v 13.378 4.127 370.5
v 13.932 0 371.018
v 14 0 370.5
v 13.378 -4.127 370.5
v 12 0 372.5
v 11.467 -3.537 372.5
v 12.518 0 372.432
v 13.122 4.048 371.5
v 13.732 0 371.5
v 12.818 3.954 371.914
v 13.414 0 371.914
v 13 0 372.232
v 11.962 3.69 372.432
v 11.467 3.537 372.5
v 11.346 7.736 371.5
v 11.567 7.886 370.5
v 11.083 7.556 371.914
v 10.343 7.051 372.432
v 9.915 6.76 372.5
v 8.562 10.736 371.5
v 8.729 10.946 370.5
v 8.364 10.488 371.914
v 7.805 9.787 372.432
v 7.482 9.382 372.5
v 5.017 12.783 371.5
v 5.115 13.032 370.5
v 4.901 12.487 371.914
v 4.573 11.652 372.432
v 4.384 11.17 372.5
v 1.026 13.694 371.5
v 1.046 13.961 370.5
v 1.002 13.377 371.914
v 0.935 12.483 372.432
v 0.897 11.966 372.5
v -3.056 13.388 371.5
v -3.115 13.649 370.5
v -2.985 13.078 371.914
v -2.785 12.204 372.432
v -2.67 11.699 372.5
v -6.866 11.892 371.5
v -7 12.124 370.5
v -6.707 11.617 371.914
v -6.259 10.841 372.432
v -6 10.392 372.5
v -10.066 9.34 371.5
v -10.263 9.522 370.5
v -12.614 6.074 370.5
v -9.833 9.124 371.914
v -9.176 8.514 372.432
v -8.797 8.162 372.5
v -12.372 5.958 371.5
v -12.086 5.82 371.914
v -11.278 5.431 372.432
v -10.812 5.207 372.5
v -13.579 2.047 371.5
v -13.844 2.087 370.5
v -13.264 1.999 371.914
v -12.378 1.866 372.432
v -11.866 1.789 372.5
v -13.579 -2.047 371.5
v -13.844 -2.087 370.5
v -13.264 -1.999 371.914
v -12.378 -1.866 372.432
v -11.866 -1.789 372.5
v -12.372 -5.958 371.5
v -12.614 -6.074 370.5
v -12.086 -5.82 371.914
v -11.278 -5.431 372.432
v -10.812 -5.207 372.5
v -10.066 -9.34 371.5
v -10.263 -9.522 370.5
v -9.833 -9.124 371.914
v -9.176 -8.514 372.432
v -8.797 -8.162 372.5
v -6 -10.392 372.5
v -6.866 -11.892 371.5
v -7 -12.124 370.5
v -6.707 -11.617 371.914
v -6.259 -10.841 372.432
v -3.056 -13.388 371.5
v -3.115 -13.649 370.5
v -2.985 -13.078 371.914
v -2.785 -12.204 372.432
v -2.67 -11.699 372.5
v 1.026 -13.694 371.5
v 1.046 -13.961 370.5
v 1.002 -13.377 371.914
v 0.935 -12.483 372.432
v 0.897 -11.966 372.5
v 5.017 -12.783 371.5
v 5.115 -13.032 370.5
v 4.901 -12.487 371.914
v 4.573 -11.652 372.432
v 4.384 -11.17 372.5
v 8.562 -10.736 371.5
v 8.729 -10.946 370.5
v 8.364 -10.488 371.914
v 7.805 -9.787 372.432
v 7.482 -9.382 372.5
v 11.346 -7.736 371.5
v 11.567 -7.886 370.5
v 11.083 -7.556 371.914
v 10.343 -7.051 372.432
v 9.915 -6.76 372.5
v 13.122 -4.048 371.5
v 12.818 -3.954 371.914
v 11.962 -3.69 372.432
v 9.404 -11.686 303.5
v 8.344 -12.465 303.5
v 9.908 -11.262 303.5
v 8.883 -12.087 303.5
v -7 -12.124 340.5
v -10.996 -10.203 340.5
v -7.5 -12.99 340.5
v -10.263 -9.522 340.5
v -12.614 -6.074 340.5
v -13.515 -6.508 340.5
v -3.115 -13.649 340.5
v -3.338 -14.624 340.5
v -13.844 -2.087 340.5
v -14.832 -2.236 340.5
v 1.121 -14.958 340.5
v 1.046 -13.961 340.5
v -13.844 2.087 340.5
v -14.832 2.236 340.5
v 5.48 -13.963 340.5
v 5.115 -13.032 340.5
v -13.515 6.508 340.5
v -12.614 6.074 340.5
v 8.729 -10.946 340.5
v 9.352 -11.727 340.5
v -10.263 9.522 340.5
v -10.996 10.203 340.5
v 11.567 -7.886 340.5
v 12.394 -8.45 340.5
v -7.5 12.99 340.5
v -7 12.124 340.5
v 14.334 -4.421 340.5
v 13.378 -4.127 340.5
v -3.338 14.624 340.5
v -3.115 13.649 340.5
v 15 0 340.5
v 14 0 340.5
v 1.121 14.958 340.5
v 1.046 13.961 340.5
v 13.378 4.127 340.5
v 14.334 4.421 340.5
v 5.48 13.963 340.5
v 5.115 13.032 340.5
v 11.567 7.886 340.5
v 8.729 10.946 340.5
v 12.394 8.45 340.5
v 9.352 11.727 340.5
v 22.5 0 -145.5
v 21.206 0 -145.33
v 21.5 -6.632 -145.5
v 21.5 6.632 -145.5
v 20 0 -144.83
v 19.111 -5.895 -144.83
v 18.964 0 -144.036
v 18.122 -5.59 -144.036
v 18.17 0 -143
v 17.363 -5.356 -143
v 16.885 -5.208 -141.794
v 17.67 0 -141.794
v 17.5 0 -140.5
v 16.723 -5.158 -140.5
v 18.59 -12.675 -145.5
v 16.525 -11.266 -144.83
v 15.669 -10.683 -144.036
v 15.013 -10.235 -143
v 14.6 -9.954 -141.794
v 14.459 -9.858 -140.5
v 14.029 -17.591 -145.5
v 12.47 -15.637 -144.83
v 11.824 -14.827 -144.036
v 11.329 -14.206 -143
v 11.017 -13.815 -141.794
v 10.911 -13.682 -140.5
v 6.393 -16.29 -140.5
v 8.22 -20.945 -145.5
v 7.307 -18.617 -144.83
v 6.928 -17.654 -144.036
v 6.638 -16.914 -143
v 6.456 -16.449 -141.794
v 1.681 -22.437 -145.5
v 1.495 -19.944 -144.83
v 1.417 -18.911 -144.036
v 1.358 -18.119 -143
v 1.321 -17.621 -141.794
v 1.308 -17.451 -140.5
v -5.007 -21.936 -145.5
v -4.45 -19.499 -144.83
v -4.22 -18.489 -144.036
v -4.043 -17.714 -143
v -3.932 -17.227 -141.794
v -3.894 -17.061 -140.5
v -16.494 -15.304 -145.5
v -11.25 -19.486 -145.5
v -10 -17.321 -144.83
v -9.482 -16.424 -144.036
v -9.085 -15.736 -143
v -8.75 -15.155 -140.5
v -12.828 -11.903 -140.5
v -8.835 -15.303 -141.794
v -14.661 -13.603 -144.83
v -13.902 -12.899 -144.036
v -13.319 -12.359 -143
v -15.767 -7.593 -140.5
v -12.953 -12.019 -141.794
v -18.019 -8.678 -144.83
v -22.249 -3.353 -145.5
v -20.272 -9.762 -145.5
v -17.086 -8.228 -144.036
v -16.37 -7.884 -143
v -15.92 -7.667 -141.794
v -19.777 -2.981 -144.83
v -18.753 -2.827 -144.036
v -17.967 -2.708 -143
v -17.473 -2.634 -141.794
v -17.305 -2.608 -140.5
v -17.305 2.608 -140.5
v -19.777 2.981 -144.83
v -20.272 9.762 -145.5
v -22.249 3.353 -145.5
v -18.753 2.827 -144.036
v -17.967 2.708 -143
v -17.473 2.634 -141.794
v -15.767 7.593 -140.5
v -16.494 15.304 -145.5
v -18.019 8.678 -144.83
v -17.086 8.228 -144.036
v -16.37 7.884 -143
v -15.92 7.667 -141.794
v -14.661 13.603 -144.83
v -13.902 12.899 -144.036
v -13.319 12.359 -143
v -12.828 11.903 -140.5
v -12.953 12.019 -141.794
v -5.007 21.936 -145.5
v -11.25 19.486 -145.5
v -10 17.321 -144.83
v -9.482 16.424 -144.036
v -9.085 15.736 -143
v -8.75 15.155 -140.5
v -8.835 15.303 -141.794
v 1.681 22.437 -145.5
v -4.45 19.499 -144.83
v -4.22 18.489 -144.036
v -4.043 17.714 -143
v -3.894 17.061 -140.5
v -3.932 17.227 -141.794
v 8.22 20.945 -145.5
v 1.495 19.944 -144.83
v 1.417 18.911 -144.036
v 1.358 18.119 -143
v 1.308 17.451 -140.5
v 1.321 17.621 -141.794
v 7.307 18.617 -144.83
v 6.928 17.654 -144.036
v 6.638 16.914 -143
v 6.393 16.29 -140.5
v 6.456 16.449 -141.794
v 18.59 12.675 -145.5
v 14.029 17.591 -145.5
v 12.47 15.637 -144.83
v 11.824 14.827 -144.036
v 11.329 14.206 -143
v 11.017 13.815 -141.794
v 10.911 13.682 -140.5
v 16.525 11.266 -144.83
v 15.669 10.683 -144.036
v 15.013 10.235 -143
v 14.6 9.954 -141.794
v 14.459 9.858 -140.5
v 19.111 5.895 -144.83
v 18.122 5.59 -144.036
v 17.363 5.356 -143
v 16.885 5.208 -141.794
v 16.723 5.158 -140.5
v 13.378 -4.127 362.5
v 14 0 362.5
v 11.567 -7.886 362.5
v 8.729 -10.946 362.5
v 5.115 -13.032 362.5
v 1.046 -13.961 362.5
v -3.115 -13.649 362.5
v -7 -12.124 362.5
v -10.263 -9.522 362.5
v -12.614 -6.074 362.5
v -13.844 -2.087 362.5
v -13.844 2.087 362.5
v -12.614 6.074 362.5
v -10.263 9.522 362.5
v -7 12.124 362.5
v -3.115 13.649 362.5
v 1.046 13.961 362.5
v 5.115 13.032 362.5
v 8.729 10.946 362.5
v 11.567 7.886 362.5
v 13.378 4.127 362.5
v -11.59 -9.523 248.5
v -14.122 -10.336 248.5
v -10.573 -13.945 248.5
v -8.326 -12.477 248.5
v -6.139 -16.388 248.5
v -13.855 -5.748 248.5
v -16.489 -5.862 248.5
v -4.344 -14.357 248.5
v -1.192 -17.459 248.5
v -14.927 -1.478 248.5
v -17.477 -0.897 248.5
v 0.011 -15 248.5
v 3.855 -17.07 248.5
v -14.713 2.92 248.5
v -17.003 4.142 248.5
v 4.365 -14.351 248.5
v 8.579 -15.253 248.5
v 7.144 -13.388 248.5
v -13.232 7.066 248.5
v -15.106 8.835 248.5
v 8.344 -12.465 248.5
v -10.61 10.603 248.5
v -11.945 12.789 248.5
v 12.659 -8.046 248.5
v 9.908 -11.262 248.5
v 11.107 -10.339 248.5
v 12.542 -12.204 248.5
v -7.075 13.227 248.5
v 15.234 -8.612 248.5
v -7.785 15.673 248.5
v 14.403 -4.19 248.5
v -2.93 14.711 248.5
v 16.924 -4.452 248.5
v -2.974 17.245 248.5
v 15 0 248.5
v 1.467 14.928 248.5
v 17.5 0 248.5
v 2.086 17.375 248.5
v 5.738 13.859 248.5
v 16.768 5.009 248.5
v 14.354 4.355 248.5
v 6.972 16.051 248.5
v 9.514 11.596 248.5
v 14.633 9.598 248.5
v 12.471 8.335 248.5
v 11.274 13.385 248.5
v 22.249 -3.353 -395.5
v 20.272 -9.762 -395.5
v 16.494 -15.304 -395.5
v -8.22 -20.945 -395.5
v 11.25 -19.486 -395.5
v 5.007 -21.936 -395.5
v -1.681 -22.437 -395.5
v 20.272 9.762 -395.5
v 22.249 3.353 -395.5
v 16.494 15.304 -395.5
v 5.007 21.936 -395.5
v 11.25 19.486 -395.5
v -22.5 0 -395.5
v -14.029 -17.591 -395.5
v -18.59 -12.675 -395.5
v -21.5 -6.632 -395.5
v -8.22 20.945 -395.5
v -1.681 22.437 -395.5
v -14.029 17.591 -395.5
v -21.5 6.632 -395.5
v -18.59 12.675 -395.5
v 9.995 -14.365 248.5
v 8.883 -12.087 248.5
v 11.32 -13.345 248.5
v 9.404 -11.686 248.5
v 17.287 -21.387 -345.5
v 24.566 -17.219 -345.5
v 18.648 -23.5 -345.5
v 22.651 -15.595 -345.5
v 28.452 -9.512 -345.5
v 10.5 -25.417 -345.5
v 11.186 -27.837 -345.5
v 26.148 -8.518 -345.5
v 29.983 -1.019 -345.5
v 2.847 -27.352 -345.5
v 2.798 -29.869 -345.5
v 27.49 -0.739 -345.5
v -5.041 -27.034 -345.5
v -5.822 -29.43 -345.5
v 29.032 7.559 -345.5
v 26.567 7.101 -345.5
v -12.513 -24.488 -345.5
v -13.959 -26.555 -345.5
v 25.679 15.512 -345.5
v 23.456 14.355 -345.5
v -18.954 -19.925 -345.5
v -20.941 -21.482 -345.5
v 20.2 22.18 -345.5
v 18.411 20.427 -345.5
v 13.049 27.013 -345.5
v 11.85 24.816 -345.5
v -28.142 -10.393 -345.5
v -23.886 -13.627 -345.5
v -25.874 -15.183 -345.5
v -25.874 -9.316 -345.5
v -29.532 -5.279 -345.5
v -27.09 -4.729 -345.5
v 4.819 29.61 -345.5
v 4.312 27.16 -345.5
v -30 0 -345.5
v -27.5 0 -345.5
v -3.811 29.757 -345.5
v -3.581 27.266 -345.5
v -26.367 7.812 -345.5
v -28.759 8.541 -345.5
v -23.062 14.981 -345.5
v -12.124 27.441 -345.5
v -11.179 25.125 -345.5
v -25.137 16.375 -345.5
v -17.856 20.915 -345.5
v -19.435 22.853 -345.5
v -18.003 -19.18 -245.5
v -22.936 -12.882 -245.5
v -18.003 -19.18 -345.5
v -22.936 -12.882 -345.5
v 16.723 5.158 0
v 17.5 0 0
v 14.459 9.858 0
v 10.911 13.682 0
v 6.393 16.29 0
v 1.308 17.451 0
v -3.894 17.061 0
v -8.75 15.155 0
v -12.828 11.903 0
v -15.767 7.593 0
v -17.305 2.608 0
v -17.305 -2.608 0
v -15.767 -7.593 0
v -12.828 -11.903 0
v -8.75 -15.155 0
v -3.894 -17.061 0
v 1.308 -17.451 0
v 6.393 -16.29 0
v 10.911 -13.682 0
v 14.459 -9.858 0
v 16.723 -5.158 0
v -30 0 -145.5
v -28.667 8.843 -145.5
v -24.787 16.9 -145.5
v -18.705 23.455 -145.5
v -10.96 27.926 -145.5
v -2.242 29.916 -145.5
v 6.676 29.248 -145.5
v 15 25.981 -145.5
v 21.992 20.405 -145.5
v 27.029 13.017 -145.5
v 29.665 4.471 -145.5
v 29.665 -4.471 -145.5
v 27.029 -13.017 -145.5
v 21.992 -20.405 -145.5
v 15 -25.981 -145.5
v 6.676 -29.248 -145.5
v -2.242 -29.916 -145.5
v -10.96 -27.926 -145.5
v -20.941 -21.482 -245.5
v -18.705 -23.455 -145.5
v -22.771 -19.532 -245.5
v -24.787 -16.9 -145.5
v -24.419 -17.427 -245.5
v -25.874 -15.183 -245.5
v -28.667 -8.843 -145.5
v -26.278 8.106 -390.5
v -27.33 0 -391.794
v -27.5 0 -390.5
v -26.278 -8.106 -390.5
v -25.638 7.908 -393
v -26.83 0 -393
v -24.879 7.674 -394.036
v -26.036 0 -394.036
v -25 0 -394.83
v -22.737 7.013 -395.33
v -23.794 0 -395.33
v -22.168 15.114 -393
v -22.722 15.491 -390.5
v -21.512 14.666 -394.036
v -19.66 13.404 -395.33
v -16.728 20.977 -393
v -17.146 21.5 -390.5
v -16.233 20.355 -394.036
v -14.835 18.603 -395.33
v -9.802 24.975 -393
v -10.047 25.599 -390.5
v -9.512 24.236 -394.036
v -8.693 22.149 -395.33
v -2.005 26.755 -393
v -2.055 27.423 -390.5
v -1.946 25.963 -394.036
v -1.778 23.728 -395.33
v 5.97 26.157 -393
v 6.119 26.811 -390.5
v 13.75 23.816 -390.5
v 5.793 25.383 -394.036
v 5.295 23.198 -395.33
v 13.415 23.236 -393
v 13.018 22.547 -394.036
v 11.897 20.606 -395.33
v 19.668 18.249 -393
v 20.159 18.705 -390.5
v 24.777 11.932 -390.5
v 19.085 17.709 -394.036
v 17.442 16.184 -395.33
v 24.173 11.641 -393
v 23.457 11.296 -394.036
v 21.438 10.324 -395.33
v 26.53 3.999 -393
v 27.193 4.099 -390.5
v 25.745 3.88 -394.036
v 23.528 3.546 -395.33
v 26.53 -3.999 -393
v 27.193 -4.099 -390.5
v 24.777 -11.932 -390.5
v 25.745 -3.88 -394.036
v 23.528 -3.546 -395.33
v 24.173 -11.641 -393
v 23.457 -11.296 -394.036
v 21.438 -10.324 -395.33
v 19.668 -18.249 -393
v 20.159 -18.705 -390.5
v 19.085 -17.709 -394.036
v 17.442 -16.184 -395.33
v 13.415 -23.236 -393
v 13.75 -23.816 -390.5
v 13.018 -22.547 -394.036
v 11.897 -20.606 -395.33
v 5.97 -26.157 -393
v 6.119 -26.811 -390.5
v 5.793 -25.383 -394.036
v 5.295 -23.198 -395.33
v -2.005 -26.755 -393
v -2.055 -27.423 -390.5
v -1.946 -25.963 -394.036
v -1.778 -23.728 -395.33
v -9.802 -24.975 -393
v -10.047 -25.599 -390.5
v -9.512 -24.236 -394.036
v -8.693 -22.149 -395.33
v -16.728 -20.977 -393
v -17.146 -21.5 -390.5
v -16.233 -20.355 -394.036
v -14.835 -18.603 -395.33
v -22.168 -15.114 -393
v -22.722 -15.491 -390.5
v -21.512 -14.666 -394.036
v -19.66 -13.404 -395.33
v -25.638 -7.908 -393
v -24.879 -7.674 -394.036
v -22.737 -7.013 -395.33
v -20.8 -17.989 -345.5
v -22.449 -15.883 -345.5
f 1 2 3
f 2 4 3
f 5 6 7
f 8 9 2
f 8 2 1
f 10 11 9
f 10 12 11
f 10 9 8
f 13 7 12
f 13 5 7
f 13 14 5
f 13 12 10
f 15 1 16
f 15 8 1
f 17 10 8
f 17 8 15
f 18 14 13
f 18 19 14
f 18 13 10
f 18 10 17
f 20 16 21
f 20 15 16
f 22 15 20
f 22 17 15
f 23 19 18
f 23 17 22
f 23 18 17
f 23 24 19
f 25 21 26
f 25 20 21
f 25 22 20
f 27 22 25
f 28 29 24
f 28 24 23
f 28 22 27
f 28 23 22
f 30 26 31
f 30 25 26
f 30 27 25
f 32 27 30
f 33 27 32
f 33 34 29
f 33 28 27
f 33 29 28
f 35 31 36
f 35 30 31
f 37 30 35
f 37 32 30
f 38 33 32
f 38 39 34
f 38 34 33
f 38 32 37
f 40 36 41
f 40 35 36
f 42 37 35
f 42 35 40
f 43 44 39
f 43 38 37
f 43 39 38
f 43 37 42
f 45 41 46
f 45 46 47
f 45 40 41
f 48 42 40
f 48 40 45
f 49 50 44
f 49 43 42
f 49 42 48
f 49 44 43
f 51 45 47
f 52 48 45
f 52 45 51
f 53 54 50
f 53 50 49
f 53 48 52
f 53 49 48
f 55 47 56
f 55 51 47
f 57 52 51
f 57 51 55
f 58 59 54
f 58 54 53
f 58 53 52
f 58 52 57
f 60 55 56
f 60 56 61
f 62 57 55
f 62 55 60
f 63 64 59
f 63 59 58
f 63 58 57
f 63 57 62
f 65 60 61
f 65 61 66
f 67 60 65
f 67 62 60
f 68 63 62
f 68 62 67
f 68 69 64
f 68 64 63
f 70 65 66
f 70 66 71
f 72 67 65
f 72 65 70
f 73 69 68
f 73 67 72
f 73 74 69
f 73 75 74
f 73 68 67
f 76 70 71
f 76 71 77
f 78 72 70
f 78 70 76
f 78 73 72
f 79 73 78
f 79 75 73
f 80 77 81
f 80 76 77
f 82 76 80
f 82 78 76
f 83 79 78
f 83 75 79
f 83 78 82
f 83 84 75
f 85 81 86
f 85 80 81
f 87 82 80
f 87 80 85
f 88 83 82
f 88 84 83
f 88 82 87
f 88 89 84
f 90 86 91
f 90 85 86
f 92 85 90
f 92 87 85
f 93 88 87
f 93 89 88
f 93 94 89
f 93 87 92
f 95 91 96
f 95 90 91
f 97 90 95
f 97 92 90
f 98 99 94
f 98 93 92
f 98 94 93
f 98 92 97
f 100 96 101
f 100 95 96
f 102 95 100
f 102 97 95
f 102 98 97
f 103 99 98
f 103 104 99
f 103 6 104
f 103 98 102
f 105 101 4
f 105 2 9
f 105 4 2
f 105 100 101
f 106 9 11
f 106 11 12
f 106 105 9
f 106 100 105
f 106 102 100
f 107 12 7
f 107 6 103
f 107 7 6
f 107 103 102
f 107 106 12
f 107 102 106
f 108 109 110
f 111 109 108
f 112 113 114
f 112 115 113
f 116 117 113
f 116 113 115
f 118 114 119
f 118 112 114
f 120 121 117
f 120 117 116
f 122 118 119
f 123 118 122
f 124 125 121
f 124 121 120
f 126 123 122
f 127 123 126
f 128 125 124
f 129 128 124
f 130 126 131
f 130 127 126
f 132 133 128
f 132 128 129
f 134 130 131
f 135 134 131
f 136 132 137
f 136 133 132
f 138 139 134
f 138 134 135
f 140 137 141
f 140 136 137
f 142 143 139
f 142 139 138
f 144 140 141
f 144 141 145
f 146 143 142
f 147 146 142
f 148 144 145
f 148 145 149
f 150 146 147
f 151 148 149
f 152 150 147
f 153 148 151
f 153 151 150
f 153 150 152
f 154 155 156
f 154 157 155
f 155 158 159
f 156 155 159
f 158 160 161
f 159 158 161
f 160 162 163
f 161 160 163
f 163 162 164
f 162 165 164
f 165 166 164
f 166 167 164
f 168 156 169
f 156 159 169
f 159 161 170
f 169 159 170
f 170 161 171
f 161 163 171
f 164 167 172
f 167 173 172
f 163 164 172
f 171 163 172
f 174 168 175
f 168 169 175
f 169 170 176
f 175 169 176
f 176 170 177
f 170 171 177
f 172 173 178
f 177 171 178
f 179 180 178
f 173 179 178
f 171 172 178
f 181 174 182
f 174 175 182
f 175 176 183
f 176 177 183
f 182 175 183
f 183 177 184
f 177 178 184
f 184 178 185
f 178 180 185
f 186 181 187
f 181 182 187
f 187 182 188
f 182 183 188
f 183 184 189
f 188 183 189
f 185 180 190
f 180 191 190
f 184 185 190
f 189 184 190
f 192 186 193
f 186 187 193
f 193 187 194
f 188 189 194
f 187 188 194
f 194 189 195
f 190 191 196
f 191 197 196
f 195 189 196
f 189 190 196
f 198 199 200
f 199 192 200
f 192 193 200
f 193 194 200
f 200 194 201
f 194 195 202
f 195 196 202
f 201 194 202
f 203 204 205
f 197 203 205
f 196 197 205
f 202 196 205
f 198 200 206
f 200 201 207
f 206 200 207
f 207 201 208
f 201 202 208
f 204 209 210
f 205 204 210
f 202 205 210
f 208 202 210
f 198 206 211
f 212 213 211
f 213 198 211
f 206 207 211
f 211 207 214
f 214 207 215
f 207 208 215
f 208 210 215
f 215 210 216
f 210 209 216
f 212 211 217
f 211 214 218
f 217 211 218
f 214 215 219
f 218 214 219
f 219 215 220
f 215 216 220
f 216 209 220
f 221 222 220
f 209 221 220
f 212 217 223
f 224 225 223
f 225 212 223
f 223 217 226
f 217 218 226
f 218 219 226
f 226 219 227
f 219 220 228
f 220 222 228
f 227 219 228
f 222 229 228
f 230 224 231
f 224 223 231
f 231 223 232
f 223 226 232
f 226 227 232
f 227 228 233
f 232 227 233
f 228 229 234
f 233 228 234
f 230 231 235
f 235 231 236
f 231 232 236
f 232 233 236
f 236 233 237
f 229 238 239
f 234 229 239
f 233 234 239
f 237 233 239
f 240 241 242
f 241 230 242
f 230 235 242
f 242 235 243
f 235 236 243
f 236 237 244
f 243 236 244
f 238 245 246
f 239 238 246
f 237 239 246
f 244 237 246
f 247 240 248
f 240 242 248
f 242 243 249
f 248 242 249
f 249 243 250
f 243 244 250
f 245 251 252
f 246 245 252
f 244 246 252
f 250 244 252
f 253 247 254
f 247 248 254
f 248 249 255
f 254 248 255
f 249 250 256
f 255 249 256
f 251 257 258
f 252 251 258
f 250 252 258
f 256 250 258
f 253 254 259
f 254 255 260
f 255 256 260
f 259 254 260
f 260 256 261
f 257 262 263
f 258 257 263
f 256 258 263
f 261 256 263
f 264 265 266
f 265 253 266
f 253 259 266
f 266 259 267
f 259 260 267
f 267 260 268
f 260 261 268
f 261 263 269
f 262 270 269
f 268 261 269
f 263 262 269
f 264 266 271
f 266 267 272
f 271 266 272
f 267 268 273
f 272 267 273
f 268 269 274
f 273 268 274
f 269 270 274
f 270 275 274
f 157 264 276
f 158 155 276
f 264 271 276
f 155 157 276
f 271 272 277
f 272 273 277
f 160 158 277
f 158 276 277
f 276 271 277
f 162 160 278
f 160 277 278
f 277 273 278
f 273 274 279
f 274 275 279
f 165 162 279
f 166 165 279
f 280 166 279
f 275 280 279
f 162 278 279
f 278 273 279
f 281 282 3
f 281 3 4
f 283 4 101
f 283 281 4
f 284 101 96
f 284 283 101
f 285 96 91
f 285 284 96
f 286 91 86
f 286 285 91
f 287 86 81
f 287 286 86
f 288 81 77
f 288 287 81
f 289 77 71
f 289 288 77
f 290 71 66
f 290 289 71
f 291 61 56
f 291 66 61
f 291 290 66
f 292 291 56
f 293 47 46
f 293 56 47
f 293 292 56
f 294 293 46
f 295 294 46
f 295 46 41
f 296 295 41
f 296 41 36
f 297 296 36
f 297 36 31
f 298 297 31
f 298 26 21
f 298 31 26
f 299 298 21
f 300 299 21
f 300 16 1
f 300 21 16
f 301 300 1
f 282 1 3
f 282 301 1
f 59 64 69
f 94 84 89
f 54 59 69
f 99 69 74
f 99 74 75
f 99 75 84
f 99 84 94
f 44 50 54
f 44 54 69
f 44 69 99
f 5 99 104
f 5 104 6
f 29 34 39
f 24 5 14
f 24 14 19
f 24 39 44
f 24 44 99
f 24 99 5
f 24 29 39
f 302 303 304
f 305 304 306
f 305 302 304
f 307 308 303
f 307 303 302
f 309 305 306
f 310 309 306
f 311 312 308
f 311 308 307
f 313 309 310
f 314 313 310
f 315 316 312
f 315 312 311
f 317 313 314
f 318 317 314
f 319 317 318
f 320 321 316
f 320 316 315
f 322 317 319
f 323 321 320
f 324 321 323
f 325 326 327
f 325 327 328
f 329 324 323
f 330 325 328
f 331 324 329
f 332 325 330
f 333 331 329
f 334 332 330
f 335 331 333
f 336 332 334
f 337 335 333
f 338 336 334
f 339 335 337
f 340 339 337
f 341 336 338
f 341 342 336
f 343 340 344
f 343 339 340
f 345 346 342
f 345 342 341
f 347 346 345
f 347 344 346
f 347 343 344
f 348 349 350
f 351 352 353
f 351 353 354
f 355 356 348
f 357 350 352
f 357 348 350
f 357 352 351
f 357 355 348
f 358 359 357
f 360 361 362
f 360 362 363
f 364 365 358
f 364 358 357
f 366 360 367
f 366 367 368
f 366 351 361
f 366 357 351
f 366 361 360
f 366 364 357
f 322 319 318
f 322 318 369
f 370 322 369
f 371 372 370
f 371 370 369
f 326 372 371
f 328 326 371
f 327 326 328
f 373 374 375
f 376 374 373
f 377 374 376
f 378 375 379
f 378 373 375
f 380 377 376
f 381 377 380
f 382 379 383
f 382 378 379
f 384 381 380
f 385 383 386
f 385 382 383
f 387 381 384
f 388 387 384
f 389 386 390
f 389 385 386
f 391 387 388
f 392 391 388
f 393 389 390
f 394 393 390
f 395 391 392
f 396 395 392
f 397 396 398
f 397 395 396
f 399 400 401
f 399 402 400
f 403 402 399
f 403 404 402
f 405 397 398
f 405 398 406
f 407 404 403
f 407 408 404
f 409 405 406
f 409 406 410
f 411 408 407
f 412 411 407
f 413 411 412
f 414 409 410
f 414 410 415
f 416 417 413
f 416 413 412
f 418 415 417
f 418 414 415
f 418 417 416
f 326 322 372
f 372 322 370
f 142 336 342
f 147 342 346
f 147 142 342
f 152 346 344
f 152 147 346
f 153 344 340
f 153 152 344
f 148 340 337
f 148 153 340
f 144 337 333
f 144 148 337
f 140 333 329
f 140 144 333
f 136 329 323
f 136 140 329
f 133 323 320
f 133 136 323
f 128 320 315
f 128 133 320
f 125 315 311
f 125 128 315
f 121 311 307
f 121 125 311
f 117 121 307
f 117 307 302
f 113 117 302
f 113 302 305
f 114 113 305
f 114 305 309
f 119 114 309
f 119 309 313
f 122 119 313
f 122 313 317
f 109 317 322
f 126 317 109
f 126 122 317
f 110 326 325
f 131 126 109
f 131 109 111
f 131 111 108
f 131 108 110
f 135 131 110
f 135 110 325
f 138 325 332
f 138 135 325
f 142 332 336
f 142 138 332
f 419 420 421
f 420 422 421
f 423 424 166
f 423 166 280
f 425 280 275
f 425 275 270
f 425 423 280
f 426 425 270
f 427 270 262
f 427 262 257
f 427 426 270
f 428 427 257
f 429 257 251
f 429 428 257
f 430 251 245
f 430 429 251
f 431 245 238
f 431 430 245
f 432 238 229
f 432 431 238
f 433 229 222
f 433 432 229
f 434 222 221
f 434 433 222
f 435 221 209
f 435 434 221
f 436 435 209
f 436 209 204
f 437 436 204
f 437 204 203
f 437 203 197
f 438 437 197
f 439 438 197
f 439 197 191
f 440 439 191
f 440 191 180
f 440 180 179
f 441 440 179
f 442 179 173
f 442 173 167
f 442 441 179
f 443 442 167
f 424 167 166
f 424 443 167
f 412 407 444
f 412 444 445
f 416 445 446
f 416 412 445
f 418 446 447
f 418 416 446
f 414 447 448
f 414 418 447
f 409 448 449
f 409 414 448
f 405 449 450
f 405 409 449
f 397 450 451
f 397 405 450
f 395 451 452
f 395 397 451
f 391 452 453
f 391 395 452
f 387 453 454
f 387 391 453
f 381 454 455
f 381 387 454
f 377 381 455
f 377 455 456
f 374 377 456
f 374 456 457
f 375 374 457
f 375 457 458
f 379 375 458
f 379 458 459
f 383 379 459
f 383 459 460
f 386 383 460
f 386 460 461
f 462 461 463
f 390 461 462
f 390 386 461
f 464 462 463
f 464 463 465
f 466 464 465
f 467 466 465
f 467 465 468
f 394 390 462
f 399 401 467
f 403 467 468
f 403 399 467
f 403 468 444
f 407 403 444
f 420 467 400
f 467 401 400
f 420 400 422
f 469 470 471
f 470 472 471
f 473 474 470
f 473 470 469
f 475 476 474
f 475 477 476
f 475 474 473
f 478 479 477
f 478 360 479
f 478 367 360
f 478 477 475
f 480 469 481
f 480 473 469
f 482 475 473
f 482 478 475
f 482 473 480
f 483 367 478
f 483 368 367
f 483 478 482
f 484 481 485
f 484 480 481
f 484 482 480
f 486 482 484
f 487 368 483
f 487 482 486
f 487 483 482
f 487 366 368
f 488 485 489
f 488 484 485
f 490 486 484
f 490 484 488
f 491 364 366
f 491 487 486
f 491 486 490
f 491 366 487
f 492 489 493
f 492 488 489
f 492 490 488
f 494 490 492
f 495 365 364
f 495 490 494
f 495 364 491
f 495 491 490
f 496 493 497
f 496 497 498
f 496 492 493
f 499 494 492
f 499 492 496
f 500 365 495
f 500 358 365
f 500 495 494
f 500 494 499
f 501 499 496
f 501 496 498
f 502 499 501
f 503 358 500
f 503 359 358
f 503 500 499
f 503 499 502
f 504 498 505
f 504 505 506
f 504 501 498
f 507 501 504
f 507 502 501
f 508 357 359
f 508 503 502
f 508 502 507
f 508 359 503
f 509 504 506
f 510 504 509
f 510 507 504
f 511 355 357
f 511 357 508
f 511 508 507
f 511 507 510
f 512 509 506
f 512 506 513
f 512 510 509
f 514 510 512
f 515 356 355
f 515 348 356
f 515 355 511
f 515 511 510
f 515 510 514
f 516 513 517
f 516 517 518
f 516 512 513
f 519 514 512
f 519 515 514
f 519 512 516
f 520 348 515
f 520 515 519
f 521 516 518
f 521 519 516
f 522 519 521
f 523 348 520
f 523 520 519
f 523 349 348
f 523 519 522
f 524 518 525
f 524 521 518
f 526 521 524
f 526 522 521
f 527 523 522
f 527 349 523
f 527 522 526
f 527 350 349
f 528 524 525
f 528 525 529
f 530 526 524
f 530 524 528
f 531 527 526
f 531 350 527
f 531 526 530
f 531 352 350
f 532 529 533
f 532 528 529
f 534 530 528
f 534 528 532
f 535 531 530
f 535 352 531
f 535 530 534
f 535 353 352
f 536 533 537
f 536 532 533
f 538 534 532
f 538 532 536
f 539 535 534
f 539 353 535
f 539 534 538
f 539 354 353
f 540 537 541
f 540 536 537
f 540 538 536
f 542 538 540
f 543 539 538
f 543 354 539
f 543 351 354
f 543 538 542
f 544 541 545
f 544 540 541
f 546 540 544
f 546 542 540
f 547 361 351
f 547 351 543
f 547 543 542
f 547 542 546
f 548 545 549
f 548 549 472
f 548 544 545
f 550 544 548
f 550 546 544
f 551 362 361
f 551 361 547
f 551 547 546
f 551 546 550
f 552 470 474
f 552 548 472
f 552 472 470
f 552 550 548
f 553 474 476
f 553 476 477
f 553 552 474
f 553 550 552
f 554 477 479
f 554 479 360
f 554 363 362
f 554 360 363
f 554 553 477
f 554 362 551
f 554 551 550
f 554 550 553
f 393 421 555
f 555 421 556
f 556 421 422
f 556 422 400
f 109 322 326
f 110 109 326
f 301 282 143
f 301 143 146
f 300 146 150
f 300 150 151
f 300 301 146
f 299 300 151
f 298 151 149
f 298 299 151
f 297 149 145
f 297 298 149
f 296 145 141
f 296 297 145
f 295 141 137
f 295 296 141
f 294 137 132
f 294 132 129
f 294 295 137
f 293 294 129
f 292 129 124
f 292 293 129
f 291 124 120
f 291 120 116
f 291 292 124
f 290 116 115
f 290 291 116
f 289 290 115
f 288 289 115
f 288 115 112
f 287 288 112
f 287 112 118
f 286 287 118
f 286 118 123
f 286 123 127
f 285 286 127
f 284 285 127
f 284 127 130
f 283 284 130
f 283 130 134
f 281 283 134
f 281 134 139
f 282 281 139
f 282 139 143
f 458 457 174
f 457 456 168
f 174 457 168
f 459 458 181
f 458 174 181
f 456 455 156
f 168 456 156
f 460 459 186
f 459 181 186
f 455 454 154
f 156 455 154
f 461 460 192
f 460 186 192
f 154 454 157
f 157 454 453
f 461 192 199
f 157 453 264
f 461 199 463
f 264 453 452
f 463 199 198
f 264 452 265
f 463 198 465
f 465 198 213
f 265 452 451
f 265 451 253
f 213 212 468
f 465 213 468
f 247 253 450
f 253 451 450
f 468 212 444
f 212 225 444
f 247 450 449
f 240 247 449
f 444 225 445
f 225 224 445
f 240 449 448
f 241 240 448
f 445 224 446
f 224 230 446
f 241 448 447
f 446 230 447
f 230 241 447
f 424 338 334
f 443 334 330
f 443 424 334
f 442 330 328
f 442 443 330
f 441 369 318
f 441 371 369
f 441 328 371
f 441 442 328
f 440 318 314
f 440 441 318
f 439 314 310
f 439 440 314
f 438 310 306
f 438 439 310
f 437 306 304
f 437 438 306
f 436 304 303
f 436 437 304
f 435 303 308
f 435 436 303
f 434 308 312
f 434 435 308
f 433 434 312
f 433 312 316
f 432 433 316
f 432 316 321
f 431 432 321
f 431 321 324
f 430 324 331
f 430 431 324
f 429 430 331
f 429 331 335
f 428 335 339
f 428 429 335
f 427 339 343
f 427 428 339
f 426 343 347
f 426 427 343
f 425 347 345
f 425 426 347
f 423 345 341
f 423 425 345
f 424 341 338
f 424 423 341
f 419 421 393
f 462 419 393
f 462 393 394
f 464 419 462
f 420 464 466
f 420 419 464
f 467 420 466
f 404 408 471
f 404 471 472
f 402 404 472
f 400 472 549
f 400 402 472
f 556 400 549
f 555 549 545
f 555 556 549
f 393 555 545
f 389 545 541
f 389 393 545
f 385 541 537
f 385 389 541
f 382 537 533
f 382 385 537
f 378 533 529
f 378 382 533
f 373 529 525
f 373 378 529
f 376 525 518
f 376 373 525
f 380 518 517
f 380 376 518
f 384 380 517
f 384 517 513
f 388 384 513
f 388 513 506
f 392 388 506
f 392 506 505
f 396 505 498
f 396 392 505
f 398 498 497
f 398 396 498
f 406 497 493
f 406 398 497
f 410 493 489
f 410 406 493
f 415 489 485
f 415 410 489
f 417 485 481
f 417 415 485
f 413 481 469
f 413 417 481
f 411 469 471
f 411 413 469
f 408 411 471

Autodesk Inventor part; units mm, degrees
ref_plane "YZ Plane" through (0, 0, 0) normal (1, 0, 0) x (0, 1, 0)
ref_plane "XZ Plane" through (0, 0, 0) normal (0, 1, 0) x (-1, 0, 0)
ref_plane "XY Plane" through (0, 0, 0) normal (0, 0, 1) x (1, 0, 0)
sketch "Sketch1" plane through (0, 0, 0) normal (0, 0, 1) x (1, 0, 0)
  circle A0 centre (0, 0) radius 17.5
  dimension "d0" = 35
extrude "Extrusion1" add sketch "Sketch1" along normal mid plane 725
sketch "Sketch3" plane through (0, 0, 362.5) normal (0, 0, 1) x (1, 0, 0)
  circle A0 centre (0, 0) radius 15
  circle A1 centre (0, 0) radius 17.5 projected
  dimension "d6" = 30
extrude "Extrusion3" cut sketch "Sketch3" against normal blind 114
sketch "Sketch4" plane through (0, 0, 362.5) normal (0, 0, 1) x (1, 0, 0)
  circle A0 centre (0, 0) radius 14
  circle A1 centre (0, 0) radius 15 projected
  dimension "d9" = 28
extrude "Extrusion4" cut sketch "Sketch4" against normal blind 22
thread "Thread1" size "M28x2" class "6g" standard "ANSI Metric M Profile" full length
sketch "Sketch5" plane through (0, 0, 362.5) normal (0, 0, 1) x (1, 0, 0)
  circle A0 centre (0, 0) radius 14 projected
extrude "Extrusion5" add sketch "Sketch5" along normal blind 10
fillet "Fillet1" radius 2 1 edges at (-14, 0, 372.5)
sketch "Sketch6" plane through (0, 0, 248.5) normal (0, 0, 1) x (1, 0, 0)
  line L0 (11.1074, -10.3393) -> (14.156, -14.3025) projected
  line L1 (7.1443, -13.3879) -> (11.1074, -10.3393) projected
  line L2 (7.1443, -13.3879) -> (10.1929, -17.351) projected
  line L3 (10.1929, -17.351) -> (14.156, -14.3025) projected
  point P0 (0, 0)
extrude "Extrusion6" cut sketch "Sketch6" along normal blind 55
sketch "Sketch7" plane through (0, 0, -362.5) normal (0, 0, -1) x (-1, 0, 0)
  circle A0 centre (0, 0) radius 17.5 projected
extrude "Extrusion7" cut sketch "Sketch7" against normal blind 17
sketch "Sketch8" plane through (0, 0, -345.5) normal (0, 0, -1) x (-1, 0, 0)
  circle A0 centre (0, 0) radius 30
  dimension "d21" = 60
extrude "Extrusion8" add sketch "Sketch8" against normal blind 200
fillet "Fillet2" radius 5 1 edges at (-17.5, 0, -145.5)
sketch "Sketch9" plane through (0, 0, -345.5) normal (0, 0, -1) x (-1, 0, 0)
  circle A0 centre (0, 0) radius 17.5 projected
  circle A1 centre (0, 0) radius 27.5
  dimension "d25" = 55
extrude "Extrusion9" add sketch "Sketch9" along normal blind 50 contours A0 | A1
sketch "Sketch10" plane through (0, 0, -345.5) normal (0, 0, -1) x (-1, 0, 0)
  line L0 (59.3657, -110.0033) -> (360.8409, -346.1125) projected
  arc A0 (360.8409, -346.1125) -> (422.4996, -267.3838) centre (0, 0) ccw projected
  line L1 (422.4996, -267.3838) -> (121.0244, -31.2746) projected
  arc A1 (121.0244, -31.2746) -> (65.5828, 106.4138) centre (0, 0) ccw projected
  line L2 (65.5828, 106.4138) -> (119.3218, 485.5536) projected
  arc A2 (119.3218, 485.5536) -> (20.3114, 499.5873) centre (0, 0) ccw projected
  line L3 (20.3114, 499.5873) -> (-33.4276, 120.4475) projected
  arc A3 (-33.4276, 120.4475) -> (-124.9485, 3.5894) centre (0, 0) ccw projected
  line L4 (-124.9485, 3.5894) -> (-480.1627, -139.4411) projected
  arc A4 (-480.1627, -139.4411) -> (-442.811, -232.2034) centre (0, 0) ccw projected
  line L5 (-442.811, -232.2034) -> (-87.5968, -89.1729) projected
  arc A5 (-87.5968, -89.1729) -> (59.3657, -110.0033) centre (0, 0) ccw projected
  line L6 (25.8741, -15.1833) -> (28.4468, -17.1982) projected
  line L7 (28.4468, -17.1982) -> (23.5141, -23.4965) projected
  line L8 (23.5141, -23.4965) -> (20.9414, -21.4816) projected
  arc A6 (25.8741, -15.1833) -> (20.9414, -21.4816) centre (0, 0) ccw projected
  line L9 (23.5141, -23.4965) -> (28.4468, -17.1982)
  line L10 (28.4468, -17.1982) -> (22.9358, -12.8821)
  line L11 (22.9358, -12.8821) -> (18.0031, -19.1804)
  line L12 (18.0031, -19.1804) -> (23.5141, -23.4965)
  point P0 (0, 0)
  dimension "d28" = 7
  dimension "d31" = 8
extrude "Extrusion10" cut sketch "Sketch10" against normal blind 100 contours L6 L7 L8 L12 L11 L10
thread "Thread2" size "M55x4" class "6g" standard "ANSI Metric M Profile" full length
fillet "Fillet3" radius 5 1 edges at (27.5, 0, -395.5)
properties part number "Lower Shaft"
